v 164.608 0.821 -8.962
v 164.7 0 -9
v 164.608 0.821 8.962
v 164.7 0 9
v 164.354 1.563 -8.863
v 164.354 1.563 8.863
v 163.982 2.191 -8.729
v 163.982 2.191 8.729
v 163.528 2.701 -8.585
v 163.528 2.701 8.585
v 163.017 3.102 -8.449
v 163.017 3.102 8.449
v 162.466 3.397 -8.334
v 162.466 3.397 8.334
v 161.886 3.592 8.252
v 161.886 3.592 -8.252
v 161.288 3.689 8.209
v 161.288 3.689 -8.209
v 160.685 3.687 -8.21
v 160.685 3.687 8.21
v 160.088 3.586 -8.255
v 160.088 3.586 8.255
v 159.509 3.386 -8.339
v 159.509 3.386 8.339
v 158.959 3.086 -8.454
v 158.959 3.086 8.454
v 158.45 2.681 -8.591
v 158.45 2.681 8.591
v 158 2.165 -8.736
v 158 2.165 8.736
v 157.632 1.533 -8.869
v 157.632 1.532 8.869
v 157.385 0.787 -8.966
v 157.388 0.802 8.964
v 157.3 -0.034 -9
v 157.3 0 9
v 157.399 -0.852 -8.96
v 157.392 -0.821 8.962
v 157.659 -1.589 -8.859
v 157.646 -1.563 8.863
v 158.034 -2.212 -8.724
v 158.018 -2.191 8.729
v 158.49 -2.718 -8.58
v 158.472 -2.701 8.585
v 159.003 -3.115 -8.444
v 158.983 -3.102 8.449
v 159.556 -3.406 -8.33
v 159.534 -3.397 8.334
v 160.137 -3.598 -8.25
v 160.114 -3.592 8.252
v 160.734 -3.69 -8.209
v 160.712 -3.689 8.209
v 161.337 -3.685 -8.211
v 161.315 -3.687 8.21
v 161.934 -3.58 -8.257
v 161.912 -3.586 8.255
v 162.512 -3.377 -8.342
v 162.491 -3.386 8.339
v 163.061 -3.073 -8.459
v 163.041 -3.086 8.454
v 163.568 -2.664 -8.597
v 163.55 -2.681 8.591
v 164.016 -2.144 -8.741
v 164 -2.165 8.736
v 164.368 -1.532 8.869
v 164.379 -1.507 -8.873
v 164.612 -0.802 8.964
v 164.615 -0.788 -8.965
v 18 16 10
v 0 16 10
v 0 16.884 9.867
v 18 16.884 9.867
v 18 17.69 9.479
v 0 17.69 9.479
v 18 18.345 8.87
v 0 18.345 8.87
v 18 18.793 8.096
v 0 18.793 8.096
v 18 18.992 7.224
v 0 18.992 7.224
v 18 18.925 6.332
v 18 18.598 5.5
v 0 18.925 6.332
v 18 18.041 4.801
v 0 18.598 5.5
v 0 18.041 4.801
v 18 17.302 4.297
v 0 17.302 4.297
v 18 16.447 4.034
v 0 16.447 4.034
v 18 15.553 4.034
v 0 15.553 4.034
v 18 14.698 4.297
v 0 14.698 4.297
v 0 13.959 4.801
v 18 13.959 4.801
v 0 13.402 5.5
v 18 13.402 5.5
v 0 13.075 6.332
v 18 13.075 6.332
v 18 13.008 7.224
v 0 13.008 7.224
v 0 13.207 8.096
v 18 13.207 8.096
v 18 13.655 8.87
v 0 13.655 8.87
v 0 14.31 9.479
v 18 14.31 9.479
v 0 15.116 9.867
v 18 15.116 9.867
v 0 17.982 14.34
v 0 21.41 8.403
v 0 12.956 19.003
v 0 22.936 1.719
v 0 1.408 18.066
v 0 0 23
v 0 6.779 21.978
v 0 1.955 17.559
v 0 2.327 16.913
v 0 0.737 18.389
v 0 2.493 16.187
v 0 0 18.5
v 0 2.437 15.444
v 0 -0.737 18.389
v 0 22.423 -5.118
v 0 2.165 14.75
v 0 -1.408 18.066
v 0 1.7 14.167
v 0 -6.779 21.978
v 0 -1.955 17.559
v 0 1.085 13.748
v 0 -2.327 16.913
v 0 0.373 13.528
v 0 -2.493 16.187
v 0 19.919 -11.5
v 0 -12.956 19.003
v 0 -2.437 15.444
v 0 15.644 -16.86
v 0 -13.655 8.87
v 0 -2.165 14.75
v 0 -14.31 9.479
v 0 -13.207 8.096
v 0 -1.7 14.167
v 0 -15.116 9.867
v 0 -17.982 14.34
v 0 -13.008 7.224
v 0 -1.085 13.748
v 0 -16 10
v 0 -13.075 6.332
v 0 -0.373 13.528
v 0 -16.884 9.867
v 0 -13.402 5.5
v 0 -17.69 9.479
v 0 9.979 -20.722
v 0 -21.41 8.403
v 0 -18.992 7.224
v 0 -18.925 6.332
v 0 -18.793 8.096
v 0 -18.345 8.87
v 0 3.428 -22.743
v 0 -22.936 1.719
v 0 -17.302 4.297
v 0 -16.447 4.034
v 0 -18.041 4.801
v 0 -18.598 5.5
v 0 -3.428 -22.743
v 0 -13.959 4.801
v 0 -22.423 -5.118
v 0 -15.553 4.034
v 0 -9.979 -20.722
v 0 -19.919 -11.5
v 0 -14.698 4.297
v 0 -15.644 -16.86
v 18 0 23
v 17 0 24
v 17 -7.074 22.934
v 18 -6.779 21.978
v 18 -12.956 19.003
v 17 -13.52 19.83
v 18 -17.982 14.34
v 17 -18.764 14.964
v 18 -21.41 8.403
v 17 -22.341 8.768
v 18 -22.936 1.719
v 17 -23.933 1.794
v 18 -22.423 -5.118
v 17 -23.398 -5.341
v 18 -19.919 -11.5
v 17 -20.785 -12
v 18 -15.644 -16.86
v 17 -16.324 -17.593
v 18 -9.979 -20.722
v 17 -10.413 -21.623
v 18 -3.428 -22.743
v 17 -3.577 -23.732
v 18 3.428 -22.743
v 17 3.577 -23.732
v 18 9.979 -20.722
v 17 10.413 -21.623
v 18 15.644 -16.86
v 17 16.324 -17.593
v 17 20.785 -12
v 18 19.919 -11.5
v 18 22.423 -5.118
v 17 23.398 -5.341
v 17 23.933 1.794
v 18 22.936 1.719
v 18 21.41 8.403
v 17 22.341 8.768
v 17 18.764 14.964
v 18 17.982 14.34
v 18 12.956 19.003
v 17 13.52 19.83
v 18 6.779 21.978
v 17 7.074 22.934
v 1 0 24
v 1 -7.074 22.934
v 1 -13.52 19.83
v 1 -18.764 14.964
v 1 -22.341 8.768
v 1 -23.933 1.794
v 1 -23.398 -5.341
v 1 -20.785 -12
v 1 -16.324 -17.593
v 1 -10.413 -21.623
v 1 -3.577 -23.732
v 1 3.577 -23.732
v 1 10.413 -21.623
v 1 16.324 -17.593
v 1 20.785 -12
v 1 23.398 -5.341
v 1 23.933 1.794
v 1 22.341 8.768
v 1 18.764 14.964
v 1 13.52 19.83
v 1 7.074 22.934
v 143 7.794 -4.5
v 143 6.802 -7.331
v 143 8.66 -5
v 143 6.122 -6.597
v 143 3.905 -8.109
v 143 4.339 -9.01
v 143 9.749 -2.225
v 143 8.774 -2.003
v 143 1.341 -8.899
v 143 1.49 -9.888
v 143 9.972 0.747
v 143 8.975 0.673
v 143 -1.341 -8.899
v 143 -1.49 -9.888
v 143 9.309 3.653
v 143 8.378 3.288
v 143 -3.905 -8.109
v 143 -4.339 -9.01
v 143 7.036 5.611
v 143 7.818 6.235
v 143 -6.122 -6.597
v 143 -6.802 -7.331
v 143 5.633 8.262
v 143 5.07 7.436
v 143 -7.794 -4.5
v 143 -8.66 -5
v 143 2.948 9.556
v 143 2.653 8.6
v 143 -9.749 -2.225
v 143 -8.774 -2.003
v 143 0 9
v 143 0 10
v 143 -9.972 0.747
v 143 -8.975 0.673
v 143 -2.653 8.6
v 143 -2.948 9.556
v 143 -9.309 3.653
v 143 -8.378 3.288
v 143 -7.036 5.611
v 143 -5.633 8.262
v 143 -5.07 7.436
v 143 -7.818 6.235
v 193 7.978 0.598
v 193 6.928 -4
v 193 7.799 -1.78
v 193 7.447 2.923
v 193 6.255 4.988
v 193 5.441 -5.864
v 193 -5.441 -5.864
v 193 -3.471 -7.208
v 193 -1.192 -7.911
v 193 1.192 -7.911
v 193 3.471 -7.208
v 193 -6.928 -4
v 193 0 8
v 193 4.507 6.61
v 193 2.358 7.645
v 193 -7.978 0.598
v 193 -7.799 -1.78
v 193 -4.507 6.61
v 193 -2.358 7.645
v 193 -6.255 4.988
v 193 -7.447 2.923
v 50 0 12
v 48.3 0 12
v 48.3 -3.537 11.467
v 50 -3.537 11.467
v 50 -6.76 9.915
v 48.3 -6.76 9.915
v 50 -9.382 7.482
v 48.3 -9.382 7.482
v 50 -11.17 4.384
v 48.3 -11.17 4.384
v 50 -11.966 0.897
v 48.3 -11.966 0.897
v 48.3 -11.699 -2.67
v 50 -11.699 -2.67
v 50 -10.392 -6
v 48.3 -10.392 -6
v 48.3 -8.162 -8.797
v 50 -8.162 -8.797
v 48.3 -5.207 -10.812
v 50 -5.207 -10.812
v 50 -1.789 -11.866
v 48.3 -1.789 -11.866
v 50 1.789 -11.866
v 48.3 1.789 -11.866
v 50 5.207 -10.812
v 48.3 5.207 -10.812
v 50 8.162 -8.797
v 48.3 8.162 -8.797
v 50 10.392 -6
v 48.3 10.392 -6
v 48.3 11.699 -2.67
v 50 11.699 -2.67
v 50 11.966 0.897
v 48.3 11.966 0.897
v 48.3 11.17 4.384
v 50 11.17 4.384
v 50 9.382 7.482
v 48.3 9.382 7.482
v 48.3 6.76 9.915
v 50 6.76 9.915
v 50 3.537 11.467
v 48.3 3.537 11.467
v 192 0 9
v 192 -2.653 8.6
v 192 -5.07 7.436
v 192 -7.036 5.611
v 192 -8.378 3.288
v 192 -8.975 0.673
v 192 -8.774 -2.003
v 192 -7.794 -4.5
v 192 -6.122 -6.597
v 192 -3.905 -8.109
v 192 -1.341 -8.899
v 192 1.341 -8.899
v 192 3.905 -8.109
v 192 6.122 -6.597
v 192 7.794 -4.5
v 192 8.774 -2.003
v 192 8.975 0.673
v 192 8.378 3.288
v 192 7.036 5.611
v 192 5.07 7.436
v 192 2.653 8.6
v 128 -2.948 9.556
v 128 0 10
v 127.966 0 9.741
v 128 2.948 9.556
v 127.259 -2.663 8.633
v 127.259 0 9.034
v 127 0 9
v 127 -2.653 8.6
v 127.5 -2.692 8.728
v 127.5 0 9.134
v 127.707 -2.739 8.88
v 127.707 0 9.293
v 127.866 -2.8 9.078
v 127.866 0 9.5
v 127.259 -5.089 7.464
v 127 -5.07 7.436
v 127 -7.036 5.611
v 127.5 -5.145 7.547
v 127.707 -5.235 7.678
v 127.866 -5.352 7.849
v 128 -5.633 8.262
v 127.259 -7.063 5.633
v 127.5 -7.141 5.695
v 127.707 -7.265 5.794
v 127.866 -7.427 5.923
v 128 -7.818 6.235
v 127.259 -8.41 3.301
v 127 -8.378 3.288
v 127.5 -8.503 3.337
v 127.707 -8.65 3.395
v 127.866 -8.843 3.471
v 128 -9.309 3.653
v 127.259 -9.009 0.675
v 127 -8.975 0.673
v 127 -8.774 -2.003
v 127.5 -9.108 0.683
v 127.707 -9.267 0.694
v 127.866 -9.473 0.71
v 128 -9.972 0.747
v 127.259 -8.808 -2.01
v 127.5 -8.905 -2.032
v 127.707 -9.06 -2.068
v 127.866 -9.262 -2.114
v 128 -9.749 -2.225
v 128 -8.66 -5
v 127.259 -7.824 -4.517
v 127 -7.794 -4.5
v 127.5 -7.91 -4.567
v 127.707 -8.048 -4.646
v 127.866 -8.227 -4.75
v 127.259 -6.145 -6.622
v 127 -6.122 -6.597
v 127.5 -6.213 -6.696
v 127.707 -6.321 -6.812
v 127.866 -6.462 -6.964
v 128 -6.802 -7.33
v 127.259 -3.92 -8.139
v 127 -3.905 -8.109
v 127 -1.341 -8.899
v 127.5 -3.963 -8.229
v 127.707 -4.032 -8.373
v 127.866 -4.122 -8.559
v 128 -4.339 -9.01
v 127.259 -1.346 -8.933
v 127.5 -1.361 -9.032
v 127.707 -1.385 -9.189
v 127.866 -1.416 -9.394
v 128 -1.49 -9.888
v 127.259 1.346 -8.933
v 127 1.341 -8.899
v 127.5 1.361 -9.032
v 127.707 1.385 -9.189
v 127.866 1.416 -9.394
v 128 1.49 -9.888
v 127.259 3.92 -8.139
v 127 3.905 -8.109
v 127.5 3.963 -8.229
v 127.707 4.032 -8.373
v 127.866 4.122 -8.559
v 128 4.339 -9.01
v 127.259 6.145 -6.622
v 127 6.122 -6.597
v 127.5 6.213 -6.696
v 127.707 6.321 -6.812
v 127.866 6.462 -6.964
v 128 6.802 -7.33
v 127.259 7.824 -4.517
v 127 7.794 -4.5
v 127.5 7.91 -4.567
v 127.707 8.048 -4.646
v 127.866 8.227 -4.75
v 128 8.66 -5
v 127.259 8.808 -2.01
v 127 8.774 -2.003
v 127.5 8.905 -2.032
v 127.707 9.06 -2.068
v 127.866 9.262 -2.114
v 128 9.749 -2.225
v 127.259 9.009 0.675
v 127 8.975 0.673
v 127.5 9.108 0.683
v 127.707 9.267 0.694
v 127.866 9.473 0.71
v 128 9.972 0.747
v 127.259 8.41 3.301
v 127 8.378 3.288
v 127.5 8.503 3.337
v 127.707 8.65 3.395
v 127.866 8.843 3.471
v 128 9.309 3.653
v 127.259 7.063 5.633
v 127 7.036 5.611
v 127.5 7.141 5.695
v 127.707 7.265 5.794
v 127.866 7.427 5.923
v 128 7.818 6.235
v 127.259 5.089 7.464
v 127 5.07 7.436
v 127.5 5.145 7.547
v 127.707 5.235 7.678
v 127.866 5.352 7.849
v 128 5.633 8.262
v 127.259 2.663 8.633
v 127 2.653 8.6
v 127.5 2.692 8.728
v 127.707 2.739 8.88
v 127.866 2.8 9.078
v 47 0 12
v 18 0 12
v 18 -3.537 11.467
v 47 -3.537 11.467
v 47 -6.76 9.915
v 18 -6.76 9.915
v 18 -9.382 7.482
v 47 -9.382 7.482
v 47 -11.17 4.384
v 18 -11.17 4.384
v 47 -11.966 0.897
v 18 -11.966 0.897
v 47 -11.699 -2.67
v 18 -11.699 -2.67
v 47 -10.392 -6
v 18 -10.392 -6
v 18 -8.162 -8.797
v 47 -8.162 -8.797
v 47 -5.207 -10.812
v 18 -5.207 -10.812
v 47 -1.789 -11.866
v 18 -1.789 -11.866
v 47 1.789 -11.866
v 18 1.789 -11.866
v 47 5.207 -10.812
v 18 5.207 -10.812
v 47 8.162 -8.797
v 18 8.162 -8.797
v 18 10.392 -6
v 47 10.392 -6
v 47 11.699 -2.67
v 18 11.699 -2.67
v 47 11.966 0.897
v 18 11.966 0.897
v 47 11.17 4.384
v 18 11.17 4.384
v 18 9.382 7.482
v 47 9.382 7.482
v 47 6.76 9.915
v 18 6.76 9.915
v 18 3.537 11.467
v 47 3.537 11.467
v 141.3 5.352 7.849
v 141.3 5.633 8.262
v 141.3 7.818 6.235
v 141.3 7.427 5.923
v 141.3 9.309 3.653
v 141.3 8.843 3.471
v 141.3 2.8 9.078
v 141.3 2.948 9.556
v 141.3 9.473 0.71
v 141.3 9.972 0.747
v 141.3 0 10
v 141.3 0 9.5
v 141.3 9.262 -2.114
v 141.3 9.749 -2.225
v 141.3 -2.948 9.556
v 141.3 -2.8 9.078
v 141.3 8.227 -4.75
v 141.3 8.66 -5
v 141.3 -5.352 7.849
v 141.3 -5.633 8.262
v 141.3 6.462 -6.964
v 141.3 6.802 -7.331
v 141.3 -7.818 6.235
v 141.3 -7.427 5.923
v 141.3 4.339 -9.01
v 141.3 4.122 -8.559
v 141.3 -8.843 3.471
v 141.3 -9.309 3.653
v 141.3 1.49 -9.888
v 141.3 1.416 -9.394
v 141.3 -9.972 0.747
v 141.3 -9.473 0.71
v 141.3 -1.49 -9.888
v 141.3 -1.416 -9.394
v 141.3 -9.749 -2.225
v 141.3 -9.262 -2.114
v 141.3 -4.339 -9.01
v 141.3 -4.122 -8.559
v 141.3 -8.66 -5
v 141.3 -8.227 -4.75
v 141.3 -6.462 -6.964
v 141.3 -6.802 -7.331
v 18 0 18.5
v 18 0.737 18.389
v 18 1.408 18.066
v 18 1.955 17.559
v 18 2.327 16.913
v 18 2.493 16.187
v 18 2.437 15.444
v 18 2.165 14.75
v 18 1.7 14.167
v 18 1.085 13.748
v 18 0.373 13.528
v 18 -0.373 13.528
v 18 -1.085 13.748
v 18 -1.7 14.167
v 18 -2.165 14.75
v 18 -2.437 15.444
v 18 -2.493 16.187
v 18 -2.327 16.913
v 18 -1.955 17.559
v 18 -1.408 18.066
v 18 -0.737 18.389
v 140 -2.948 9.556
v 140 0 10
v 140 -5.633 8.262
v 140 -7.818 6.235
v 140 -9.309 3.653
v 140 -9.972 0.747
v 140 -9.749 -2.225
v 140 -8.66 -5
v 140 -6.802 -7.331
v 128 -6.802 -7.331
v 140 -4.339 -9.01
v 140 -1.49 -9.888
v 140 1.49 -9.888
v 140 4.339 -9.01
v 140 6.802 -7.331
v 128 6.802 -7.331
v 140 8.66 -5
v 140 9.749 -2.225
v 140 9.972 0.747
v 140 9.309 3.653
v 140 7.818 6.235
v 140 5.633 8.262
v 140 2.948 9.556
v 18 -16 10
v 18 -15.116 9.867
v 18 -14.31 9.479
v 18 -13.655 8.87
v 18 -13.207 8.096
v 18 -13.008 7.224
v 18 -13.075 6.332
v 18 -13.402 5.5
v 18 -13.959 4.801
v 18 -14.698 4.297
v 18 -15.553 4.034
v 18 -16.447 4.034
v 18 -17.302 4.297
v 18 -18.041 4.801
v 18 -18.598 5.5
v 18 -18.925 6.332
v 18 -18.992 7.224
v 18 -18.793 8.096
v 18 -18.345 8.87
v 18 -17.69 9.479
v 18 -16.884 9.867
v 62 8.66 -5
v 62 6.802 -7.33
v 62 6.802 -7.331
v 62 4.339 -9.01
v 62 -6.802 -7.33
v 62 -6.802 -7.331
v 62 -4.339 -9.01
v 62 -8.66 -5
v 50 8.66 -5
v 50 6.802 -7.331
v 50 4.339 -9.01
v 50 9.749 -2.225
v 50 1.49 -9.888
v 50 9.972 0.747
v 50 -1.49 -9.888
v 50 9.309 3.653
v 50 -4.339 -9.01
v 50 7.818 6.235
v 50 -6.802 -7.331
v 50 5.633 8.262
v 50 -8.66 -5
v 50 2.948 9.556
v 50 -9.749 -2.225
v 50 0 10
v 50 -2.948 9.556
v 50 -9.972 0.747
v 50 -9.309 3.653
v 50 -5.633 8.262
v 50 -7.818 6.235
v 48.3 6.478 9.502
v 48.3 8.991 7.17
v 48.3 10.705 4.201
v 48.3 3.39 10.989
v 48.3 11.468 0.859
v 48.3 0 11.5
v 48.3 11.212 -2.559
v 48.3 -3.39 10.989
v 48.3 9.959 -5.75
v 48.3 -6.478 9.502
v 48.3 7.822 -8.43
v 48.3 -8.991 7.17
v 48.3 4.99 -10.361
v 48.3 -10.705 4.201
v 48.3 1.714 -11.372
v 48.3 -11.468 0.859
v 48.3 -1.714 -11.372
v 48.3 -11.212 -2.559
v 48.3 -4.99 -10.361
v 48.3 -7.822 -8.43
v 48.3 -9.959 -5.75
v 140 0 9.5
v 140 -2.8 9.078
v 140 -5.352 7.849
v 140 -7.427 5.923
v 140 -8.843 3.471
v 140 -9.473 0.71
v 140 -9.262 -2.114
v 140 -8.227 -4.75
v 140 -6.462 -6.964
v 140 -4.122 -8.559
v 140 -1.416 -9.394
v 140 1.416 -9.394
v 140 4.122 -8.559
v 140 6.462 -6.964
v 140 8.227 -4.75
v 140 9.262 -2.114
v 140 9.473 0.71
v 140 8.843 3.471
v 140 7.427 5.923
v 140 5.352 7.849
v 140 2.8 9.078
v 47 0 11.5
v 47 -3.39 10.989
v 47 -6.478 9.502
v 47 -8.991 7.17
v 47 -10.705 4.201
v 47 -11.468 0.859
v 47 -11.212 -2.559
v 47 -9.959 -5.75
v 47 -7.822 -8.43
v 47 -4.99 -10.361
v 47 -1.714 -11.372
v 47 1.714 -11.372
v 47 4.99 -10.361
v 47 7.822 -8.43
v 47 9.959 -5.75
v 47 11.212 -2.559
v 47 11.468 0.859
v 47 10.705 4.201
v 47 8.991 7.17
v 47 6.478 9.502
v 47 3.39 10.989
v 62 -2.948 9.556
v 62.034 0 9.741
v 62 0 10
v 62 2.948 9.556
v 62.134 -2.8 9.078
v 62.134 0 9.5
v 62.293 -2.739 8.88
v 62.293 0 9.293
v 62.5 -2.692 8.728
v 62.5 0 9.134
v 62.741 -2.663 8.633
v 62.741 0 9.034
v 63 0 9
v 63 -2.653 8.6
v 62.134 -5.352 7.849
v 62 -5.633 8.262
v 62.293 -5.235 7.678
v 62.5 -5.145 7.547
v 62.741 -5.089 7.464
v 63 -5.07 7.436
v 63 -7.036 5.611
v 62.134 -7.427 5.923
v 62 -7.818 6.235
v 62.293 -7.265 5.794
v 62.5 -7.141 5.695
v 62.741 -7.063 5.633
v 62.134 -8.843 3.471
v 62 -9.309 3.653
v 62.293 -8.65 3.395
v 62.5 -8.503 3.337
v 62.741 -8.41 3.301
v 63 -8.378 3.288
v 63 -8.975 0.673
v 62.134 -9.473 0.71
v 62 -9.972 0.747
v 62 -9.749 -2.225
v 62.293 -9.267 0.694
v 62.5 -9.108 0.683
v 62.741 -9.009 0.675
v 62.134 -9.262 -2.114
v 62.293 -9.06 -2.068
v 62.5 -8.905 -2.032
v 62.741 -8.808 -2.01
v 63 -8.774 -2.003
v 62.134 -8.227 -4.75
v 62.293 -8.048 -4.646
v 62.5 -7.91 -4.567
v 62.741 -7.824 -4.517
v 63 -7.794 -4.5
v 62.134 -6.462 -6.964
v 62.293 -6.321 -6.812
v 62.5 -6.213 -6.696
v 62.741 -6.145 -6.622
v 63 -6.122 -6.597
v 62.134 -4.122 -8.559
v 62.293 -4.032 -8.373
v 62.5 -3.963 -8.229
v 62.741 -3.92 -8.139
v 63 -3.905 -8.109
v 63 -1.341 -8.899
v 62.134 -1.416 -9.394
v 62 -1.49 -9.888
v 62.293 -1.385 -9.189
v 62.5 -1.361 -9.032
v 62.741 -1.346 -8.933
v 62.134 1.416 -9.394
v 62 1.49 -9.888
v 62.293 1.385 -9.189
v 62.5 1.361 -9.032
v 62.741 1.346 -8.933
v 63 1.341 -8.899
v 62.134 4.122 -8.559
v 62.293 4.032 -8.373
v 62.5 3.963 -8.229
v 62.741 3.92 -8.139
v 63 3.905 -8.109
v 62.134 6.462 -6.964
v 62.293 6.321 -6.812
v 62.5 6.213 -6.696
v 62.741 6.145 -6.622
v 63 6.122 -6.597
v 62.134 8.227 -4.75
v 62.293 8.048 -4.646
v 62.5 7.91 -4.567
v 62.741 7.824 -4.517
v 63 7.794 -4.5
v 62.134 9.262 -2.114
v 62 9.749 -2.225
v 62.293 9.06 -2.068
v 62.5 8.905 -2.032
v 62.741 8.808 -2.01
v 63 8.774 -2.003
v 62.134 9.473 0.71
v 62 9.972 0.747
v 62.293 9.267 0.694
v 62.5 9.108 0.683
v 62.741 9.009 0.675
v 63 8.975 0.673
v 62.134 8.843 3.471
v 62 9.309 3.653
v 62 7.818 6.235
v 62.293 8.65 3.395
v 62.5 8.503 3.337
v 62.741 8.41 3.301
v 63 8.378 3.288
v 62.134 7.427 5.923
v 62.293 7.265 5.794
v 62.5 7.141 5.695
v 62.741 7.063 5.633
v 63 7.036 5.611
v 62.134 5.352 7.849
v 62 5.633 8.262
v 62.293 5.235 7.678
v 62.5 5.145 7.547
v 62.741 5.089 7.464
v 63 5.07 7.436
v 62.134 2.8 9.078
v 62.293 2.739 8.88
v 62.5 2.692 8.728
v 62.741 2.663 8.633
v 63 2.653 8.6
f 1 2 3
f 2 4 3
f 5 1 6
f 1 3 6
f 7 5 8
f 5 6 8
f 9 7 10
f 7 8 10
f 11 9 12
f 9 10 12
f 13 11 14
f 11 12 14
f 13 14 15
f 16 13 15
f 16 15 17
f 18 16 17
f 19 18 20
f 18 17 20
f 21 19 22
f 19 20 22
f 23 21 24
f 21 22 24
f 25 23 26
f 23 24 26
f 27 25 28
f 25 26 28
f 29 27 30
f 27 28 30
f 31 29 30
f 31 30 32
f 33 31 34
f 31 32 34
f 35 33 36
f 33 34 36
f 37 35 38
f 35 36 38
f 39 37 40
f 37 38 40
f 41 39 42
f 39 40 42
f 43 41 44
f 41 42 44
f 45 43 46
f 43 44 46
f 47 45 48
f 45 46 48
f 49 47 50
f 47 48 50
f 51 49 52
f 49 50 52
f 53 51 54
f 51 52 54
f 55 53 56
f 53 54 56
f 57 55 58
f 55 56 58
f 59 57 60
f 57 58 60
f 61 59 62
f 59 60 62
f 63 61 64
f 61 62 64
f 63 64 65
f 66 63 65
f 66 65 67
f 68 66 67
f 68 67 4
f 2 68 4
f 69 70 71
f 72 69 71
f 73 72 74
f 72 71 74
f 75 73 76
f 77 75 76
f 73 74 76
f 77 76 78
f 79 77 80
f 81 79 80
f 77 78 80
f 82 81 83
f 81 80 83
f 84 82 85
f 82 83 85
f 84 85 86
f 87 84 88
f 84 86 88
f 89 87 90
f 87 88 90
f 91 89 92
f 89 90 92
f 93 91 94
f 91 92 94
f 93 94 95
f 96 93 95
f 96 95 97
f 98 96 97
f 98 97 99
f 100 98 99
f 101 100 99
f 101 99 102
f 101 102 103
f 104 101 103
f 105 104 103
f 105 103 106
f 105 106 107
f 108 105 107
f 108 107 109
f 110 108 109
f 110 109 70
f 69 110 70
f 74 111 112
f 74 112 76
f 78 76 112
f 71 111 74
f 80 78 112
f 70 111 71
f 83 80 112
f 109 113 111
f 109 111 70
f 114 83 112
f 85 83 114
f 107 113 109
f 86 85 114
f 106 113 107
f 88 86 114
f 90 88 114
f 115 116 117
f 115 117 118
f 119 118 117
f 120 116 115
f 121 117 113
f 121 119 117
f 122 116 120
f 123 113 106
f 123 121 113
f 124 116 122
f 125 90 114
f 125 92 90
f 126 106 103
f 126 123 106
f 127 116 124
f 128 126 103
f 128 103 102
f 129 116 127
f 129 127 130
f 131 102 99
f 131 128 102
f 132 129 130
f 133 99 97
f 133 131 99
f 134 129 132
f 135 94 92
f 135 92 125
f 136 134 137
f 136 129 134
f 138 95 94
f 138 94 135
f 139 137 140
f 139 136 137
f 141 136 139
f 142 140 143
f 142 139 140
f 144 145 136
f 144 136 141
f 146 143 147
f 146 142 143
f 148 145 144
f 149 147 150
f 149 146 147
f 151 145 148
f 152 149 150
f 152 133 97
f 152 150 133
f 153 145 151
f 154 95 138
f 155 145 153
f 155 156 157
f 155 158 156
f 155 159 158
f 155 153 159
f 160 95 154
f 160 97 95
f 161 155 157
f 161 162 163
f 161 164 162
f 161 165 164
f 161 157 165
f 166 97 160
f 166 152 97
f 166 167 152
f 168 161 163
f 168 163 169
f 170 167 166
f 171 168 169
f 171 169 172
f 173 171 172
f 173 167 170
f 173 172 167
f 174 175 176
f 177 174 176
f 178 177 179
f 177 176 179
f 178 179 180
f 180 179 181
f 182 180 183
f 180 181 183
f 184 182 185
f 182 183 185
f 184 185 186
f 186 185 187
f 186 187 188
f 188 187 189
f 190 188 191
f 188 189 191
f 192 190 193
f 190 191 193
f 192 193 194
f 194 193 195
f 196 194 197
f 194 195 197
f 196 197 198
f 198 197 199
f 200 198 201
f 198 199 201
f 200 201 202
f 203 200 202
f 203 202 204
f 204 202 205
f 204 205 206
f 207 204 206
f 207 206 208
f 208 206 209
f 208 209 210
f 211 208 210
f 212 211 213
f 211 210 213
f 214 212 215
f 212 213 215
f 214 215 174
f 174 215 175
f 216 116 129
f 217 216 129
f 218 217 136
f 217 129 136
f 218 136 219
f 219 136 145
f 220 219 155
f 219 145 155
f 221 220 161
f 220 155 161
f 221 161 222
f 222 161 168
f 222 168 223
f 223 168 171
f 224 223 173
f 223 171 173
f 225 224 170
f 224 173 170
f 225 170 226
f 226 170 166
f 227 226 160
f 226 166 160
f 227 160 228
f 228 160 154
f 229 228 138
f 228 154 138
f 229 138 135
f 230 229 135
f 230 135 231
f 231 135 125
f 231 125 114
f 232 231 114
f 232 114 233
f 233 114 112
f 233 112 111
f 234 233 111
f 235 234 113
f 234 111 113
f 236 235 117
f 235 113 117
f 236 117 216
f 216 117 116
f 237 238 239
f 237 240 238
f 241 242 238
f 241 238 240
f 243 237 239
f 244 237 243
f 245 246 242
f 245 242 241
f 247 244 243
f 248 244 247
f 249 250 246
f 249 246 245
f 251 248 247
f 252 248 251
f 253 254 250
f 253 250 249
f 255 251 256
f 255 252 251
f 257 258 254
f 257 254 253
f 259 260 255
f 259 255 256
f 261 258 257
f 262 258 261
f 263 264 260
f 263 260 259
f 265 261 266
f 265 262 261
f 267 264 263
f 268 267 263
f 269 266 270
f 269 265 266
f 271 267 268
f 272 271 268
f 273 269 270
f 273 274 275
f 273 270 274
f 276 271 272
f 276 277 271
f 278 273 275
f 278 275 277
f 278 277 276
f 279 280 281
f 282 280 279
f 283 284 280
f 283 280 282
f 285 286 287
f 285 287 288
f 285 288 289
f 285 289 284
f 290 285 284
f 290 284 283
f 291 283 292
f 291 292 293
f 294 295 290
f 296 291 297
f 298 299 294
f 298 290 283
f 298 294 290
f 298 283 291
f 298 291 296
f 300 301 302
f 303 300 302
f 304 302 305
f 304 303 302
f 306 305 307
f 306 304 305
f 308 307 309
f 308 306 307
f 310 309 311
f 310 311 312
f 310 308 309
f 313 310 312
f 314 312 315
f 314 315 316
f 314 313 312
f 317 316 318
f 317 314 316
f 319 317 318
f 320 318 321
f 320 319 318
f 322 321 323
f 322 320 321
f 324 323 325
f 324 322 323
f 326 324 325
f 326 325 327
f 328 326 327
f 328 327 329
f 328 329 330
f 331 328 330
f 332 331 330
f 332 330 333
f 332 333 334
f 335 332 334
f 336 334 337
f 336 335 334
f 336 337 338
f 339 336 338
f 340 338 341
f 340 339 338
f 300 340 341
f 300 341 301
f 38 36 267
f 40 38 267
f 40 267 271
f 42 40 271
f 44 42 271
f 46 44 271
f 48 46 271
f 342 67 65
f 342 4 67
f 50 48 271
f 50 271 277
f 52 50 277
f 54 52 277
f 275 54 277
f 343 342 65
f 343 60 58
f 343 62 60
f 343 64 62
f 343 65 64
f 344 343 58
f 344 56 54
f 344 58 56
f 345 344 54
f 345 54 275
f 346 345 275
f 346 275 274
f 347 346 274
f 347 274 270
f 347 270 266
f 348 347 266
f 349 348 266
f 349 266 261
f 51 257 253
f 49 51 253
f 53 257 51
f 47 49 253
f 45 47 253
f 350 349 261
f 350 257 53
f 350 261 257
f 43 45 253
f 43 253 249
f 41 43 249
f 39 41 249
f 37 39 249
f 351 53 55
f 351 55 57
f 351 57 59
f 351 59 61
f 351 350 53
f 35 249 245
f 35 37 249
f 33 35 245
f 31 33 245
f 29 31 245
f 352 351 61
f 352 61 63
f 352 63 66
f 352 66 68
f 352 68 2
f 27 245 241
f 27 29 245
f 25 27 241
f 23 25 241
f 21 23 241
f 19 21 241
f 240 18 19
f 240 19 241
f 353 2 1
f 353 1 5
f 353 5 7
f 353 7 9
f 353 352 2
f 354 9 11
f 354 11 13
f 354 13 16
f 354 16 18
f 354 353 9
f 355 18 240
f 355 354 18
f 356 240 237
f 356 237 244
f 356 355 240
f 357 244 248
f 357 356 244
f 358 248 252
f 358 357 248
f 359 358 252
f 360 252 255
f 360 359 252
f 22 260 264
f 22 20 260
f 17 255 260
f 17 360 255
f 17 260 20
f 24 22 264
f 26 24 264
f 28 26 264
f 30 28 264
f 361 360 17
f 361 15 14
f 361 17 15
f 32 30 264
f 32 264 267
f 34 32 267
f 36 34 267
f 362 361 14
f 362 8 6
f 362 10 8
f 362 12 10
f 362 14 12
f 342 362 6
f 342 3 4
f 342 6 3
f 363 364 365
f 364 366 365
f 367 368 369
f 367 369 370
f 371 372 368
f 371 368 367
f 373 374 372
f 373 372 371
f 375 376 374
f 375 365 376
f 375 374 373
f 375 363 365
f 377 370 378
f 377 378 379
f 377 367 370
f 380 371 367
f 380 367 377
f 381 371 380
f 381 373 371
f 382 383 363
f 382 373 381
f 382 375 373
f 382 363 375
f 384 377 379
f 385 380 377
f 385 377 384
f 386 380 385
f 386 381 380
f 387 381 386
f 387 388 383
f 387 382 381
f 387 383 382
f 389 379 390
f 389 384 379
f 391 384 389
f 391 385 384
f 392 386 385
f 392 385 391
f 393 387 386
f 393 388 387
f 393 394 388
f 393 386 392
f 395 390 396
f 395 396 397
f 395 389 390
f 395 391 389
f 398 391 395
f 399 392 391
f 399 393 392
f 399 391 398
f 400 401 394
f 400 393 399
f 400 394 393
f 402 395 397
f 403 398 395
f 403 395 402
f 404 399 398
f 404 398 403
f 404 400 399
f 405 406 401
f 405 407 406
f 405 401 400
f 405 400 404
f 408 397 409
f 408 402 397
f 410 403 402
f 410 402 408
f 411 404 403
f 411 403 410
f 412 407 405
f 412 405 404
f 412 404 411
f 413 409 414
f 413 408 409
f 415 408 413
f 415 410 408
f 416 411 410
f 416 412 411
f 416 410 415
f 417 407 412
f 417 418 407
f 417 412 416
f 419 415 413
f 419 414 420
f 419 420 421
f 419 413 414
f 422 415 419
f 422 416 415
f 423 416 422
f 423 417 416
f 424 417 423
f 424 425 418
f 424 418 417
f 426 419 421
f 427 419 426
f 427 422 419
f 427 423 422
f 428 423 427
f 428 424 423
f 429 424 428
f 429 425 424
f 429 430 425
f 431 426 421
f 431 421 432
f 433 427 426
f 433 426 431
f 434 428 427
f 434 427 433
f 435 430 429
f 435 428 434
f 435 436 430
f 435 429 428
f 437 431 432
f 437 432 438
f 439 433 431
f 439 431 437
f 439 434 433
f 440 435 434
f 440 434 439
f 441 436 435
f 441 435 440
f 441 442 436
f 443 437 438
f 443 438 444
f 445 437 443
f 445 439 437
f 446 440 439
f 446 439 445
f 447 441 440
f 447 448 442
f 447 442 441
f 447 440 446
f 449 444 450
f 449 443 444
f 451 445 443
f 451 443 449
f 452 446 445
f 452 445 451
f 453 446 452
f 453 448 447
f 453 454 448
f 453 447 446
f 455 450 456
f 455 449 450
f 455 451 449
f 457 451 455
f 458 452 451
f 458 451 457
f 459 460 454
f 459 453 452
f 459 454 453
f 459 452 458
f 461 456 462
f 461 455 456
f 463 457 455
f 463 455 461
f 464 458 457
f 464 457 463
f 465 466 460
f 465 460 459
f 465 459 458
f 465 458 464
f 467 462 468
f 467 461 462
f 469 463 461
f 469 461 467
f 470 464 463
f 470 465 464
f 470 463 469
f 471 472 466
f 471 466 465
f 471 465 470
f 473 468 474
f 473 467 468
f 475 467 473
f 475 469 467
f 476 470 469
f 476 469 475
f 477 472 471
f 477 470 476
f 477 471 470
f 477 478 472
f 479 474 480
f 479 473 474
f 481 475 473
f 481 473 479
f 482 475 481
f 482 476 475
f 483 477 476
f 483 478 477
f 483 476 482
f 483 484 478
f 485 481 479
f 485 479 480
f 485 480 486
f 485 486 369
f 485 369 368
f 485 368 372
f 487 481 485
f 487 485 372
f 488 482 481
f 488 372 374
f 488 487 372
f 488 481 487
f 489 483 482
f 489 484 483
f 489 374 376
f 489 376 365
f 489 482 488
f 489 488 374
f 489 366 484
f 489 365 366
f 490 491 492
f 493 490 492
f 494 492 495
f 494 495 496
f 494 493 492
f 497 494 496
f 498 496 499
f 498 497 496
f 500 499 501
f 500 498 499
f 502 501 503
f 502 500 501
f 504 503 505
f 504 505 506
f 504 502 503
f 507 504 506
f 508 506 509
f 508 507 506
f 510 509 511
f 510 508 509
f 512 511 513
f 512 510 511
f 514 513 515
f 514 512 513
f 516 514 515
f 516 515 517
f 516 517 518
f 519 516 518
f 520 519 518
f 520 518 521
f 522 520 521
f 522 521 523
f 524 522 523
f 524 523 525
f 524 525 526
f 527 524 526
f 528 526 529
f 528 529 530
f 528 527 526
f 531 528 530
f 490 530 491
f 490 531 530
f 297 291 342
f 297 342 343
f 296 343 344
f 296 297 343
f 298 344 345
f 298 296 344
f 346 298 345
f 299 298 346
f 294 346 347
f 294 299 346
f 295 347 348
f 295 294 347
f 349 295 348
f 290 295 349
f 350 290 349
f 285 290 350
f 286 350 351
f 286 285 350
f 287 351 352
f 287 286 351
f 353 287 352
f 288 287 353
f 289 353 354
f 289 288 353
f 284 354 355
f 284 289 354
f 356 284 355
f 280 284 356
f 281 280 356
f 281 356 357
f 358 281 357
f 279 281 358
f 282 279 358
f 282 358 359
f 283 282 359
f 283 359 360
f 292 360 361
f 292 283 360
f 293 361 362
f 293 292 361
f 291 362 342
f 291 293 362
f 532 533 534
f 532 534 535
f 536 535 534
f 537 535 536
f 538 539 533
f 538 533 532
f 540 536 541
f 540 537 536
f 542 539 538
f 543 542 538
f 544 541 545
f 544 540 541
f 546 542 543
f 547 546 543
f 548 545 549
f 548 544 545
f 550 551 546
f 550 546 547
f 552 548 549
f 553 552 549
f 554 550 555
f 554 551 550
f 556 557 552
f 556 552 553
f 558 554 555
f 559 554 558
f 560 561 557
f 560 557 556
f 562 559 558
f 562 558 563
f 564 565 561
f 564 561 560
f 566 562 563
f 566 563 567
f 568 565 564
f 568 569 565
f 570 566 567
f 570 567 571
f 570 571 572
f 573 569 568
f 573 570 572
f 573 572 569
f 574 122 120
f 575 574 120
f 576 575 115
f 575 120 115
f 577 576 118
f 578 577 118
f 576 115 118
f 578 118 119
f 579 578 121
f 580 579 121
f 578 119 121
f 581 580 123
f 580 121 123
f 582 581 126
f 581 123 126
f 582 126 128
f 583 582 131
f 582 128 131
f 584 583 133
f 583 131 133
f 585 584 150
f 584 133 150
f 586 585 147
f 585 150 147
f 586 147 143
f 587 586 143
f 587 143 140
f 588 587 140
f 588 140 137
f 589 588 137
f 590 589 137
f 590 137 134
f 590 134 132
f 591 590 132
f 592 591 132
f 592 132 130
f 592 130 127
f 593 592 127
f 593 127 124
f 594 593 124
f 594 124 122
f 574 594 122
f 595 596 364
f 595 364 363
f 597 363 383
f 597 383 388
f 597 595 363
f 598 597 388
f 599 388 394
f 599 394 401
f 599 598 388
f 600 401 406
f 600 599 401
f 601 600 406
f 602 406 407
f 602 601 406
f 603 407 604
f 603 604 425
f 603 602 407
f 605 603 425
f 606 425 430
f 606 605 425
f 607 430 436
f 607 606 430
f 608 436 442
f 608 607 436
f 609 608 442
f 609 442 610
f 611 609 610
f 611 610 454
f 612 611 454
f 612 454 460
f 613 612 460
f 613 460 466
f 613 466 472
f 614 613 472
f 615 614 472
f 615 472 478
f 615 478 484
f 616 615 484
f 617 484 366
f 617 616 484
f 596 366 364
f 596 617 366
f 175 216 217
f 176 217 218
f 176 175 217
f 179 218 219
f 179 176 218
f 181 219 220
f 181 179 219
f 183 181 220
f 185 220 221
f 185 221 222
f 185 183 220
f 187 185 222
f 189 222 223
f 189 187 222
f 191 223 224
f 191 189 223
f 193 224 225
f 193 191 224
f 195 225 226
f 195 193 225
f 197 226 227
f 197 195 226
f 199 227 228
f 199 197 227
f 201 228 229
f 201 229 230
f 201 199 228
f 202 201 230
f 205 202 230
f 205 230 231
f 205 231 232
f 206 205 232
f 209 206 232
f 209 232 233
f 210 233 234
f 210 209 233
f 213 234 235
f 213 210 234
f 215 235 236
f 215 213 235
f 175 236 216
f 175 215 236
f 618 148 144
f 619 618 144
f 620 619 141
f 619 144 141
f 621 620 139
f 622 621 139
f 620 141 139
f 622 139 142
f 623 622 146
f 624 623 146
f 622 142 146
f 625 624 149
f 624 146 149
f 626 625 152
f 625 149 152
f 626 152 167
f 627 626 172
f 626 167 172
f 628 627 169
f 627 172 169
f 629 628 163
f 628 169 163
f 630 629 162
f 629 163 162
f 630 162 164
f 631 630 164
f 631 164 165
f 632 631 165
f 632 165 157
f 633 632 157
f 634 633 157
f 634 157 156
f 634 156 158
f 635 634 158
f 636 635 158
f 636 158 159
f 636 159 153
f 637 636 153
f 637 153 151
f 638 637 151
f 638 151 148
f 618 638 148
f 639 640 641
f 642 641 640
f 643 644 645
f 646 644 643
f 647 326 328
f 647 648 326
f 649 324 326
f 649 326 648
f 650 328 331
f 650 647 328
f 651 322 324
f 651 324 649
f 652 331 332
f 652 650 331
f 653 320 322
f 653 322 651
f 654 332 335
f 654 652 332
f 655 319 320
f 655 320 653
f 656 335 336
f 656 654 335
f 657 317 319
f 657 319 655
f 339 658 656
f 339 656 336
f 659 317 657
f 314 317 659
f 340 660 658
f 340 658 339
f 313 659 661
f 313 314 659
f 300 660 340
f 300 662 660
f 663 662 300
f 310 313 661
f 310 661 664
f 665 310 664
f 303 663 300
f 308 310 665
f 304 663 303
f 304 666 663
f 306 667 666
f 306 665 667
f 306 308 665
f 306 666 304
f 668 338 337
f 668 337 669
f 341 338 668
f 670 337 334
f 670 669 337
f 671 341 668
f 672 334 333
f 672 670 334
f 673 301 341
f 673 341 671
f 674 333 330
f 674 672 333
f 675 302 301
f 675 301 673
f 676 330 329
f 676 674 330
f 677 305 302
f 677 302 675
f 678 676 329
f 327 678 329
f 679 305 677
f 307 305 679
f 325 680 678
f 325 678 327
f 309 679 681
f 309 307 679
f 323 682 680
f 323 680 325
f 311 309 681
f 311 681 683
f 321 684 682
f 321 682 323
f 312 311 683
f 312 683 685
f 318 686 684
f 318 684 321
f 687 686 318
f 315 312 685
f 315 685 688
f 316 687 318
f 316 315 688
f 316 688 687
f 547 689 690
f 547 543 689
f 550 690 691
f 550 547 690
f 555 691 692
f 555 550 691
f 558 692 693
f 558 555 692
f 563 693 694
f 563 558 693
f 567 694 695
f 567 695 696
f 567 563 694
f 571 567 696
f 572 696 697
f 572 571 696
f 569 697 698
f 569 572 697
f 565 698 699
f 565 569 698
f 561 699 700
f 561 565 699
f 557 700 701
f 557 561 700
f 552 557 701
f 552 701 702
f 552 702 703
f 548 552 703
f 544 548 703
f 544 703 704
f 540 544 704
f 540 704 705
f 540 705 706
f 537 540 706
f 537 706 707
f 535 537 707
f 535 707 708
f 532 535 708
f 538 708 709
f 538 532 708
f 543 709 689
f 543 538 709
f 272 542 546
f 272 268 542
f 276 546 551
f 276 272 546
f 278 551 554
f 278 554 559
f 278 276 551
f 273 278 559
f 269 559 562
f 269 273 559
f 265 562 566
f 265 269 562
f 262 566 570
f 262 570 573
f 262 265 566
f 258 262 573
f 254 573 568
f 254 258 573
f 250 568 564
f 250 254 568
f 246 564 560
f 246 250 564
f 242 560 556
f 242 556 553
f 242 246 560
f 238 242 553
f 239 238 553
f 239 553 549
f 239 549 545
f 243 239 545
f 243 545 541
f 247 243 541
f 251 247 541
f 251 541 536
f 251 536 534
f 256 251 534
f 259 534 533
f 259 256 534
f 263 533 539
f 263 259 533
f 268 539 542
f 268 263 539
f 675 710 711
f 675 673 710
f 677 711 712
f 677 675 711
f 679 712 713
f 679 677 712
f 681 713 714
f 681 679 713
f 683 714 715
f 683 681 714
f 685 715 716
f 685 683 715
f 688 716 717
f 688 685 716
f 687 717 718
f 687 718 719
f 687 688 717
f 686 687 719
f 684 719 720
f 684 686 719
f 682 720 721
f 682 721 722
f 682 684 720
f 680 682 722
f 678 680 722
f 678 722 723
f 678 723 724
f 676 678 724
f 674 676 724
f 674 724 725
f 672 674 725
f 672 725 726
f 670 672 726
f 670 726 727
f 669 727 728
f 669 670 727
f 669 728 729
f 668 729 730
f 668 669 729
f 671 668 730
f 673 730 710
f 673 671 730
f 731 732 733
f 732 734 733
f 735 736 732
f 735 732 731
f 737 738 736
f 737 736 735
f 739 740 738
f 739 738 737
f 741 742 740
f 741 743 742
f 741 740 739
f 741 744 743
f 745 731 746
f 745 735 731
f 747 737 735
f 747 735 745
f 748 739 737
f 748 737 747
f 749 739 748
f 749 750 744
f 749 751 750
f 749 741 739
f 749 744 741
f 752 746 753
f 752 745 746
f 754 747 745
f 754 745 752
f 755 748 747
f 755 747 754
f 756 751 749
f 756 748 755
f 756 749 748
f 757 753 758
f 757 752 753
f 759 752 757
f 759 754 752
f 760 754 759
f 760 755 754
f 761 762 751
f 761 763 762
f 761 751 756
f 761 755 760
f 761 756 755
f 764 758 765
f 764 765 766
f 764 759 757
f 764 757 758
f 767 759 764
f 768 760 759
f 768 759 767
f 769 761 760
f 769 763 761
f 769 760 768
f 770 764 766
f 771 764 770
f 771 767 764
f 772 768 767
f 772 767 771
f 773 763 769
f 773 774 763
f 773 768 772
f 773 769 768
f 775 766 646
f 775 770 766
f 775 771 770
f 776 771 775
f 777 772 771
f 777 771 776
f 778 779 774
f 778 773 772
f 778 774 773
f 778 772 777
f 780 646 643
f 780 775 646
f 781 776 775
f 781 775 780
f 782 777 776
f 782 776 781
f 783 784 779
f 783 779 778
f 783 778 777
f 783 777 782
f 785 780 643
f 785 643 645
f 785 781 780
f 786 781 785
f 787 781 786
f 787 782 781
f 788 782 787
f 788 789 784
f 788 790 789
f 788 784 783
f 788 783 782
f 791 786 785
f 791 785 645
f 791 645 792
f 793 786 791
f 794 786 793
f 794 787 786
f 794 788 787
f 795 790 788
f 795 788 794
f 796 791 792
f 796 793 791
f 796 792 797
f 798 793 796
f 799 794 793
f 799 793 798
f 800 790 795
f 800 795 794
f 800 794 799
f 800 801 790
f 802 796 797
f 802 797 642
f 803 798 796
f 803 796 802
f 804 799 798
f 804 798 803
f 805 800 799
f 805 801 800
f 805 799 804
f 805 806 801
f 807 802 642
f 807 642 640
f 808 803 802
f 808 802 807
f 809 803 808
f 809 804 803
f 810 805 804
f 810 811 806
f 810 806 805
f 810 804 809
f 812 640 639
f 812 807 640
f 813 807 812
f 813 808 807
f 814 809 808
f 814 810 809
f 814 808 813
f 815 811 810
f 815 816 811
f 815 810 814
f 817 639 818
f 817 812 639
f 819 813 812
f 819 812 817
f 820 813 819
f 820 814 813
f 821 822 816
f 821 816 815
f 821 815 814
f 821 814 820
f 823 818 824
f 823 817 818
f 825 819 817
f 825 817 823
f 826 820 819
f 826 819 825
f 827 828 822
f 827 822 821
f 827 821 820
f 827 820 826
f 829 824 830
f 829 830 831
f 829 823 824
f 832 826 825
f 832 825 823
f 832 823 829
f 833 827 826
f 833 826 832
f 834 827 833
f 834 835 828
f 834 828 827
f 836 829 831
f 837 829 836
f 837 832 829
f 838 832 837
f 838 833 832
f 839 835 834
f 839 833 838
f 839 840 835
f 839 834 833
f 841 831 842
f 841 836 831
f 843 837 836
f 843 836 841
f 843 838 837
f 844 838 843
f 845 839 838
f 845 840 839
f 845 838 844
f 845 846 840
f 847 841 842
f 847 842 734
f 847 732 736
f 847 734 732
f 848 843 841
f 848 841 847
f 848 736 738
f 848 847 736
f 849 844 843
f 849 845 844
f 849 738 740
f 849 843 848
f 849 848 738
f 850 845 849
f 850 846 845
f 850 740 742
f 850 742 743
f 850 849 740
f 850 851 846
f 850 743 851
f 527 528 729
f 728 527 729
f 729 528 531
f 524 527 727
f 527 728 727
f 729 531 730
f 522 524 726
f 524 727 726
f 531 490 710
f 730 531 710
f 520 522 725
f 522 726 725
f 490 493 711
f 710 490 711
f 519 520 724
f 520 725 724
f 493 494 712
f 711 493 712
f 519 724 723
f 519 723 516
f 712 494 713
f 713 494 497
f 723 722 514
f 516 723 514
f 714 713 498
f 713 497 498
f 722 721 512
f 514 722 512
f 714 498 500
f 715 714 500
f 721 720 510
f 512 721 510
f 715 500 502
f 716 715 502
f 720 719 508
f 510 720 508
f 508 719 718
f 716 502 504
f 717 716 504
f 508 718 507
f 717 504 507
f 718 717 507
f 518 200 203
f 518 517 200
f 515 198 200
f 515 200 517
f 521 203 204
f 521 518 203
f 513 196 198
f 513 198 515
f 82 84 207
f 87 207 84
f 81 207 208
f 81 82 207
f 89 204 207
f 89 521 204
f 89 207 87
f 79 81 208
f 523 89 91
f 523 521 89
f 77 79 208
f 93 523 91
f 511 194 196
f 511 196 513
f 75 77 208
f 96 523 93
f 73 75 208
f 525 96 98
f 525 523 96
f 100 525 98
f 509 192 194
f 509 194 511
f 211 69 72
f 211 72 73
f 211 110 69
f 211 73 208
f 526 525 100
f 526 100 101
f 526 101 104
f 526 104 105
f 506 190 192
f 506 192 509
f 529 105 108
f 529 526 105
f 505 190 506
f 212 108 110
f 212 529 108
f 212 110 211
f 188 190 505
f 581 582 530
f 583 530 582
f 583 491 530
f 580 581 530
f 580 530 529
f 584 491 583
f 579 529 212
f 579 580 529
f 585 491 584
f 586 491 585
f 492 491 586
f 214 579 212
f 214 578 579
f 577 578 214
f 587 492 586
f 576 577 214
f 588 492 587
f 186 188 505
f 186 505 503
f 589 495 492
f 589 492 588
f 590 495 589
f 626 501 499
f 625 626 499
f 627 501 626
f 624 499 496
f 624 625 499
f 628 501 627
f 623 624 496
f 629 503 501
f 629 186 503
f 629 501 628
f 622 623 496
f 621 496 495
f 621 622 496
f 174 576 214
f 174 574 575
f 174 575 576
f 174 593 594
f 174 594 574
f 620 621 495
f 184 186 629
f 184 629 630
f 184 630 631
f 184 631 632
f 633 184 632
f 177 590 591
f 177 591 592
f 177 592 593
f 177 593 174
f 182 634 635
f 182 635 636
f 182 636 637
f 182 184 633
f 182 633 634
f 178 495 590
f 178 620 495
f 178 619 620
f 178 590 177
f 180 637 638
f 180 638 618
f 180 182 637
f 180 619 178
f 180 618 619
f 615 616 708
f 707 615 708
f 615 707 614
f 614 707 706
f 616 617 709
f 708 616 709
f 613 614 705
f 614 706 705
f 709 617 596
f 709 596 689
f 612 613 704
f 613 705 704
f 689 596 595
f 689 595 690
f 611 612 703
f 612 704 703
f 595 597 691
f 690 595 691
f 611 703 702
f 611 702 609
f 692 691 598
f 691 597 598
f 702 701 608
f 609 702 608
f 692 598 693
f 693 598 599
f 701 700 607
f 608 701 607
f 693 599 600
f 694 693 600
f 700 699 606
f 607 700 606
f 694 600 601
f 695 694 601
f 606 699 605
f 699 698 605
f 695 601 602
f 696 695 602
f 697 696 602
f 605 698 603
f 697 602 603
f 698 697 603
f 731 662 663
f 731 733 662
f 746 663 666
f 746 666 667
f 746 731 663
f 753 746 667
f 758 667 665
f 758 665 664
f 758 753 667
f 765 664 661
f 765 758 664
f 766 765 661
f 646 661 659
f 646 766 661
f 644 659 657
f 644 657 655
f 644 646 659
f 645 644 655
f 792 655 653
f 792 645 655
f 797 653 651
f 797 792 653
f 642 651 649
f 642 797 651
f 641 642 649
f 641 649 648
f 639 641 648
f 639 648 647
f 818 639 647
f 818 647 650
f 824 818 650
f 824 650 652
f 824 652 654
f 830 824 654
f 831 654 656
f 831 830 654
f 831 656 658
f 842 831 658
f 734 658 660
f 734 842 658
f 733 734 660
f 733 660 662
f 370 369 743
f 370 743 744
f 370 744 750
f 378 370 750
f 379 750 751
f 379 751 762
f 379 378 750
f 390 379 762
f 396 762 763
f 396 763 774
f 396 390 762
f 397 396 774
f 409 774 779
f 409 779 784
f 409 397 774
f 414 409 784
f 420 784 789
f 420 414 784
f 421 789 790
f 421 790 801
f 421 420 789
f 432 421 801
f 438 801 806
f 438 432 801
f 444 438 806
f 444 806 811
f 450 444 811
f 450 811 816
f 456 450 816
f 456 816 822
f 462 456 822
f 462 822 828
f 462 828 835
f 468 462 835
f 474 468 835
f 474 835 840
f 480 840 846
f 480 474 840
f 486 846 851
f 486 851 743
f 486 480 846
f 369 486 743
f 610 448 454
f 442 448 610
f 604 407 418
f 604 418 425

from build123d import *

# Parameters (mm, degrees)
ESQUISSE2_W             = 1.3
ESQUISSE2_H             = 0.5
CONG_1_R                = 1
CHANFREIN1_SIZE         = 1
ESQUISSE3_R             = 3.7
ENL_V_MAT_EXTRU_1_DEPTH = 10
ESQUISSE4_R             = 3
ESQUISSE4_R_2           = 2.5
ENL_V_MAT_EXTRU_2_DEPTH = 196.961730958
ESQUISSE6_W             = 1.3
ESQUISSE6_H             = 0.5


with BuildPart() as part:
    # Esquisse1 → Base-Révolution (revolve)
    with BuildSketch(Plane.XY, mode=Mode.PRIVATE) as base_r_volution_sk:
        Polygon((0, 0), (0, 24), (18, 24), (18, 12), (50, 12), (50, 10), (62, 10), (62, 9), (128, 9), (128, 10), (143, 10), (143, 9), (193, 9), (193, 0), align=None)
    revolve(base_r_volution_sk.sketch.rotate(Axis((-48.771720193, 0, 0), (1, 0, 0)), 90), axis=Axis((-48.771720193, 0, 0), (1, 0, 0)))

    # Esquisse2 → Enlèvement de matière-Révolution1 (revolve, cut)
    with BuildSketch(Plane.XY, mode=Mode.PRIVATE) as enl_vement_de_mati_re_r_volution1_sk:
        with Locations((47.65, 11.75)):
            Rectangle(ESQUISSE2_W, ESQUISSE2_H)
    revolve(enl_vement_de_mati_re_r_volution1_sk.sketch.rotate(Axis((0, 0, 0), (1, 0, 0)), 90), axis=Axis((0, 0, 0), (1, 0, 0)), mode=Mode.SUBTRACT)

    # Congé1
    cong_1_edges = [part.edges().sort_by_distance(p)[0] for p in [
        (62, 0, -9),
        (128, 0, -9),
    ]]
    fillet(cong_1_edges, radius=CONG_1_R - 0.0001)  # a hair under: the kernel refuses the full size

    # Chanfrein1
    chanfrein1_edges = [part.edges().sort_by_distance(p)[0] for p in [
        (193, 0, -9),
        (18, 0, -24),
        (0, 0, -24),
    ]]
    chamfer(chanfrein1_edges, length=CHANFREIN1_SIZE)

    # Esquisse3 → Enlèv. mat.-Extru.1 (cut, symmetric)
    with BuildSketch(Plane.XY):
        with Locations((161, 0)):
            Circle(ESQUISSE3_R)
    extrude(amount=ENL_V_MAT_EXTRU_1_DEPTH, both=True, mode=Mode.SUBTRACT)

    # Esquisse4 → Enlèv. mat.-Extru.2 (cut, through all)
    with BuildSketch(Plane.ZY):
        with Locations((7, 16)):
            Circle(ESQUISSE4_R)
        with Locations((7, -16)):
            Circle(ESQUISSE4_R)
        with Locations((16, 0)):
            Circle(ESQUISSE4_R_2)
    extrude(amount=-ENL_V_MAT_EXTRU_2_DEPTH, mode=Mode.SUBTRACT)

    # Esquisse6 → Enlèvement de matière-Révolution2 (revolve, cut)
    with BuildSketch(Plane.XY, mode=Mode.PRIVATE) as enl_vement_de_mati_re_r_volution2_sk:
        with Locations((140.65, 9.75)):
            Rectangle(ESQUISSE6_W, ESQUISSE6_H)
    revolve(enl_vement_de_mati_re_r_volution2_sk.sketch.rotate(Axis((141.562186711, 0, 0), (1, 0, 0)), 90), axis=Axis((141.562186711, 0, 0), (1, 0, 0)), mode=Mode.SUBTRACT)


solid = part.part
